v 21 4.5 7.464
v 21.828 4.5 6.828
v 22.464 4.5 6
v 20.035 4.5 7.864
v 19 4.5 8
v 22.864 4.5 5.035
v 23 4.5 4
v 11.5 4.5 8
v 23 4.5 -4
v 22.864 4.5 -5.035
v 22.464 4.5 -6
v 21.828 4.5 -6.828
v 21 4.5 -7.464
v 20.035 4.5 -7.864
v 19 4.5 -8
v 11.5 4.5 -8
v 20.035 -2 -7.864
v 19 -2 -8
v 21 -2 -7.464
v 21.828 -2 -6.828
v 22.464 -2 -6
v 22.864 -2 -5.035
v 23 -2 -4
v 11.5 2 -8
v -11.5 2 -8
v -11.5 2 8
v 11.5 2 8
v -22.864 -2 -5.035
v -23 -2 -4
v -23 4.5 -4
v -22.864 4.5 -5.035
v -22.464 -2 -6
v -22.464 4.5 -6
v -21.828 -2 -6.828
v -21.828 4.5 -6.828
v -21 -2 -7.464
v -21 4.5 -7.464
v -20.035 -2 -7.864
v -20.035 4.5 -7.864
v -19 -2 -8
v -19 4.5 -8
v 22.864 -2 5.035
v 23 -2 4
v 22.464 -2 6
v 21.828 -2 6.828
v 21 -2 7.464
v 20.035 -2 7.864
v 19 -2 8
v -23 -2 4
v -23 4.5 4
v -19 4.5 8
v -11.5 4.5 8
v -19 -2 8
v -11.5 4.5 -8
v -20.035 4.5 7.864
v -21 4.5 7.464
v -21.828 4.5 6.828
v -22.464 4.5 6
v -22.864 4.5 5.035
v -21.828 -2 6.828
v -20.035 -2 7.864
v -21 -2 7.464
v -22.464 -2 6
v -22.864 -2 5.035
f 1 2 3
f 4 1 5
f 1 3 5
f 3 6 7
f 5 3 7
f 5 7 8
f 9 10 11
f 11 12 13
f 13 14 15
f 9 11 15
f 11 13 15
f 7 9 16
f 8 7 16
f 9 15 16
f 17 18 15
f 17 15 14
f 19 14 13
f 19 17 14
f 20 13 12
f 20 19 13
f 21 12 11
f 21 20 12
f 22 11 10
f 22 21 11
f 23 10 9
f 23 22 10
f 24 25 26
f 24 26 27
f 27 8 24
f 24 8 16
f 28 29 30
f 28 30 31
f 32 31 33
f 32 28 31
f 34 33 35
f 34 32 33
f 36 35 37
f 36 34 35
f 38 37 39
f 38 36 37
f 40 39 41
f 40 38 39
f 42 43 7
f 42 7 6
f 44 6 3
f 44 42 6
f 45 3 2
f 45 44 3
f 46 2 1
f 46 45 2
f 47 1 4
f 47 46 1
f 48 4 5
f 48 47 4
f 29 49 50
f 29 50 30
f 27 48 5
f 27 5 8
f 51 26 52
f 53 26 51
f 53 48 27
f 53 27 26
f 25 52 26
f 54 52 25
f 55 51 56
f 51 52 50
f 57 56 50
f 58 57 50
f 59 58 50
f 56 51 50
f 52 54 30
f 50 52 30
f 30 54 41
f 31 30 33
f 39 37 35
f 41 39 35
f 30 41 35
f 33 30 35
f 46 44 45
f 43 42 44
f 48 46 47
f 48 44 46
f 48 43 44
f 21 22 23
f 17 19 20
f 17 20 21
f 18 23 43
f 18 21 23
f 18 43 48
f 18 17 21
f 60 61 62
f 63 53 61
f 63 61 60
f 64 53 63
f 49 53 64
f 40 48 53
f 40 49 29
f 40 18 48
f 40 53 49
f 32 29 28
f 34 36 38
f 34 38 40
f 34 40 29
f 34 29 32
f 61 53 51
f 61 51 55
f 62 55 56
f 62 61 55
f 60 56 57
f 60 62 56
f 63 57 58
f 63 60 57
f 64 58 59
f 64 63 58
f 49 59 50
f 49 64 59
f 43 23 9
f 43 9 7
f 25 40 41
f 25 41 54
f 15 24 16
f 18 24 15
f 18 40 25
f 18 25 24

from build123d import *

# Parameters (mm, degrees)
SALIENTE_EXTRUIR1_DEPTH      = 4.5
SALIENTE_EXTRUIR1_DEPTH_BACK = 2
CROQUIS2_W                   = 23
CROQUIS2_H                   = 20.20150629
CORTAR_EXTRUIR1_DEPTH        = 2.5


with BuildPart() as part:
    # Croquis1 → Saliente-Extruir1 (new, two sides: drawn at the far end of the back side and taken through both)
    with BuildSketch(Plane(origin=(0, 0, 0), x_dir=(1, 0, 0), z_dir=(0, 1, 0)).offset(-SALIENTE_EXTRUIR1_DEPTH_BACK)):
        with BuildLine():
            Line((-19, 8), (19, 8))
            ThreePointArc((19, 8), (21.828427125, 6.828427125), (23, 4))
            Line((23, 4), (23, -4))
            ThreePointArc((23, -4), (21.828427125, -6.828427125), (19, -8))
            Line((19, -8), (-19, -8))
            ThreePointArc((-19, -8), (-21.828427125, -6.828427125), (-23, -4))
            Line((-23, -4), (-23, 4))
            ThreePointArc((-23, 4), (-21.828427125, 6.828427125), (-19, 8))
        make_face()
    extrude(amount=SALIENTE_EXTRUIR1_DEPTH + SALIENTE_EXTRUIR1_DEPTH_BACK)

    # Croquis2 → Cortar-Extruir1 (cut)
    with BuildSketch(Plane(origin=(0, 4.5, 0), x_dir=(1, 0, 0), z_dir=(0, 1, 0))):
        Rectangle(CROQUIS2_W, CROQUIS2_H)
    extrude(amount=-CORTAR_EXTRUIR1_DEPTH, mode=Mode.SUBTRACT)


solid = part.part
